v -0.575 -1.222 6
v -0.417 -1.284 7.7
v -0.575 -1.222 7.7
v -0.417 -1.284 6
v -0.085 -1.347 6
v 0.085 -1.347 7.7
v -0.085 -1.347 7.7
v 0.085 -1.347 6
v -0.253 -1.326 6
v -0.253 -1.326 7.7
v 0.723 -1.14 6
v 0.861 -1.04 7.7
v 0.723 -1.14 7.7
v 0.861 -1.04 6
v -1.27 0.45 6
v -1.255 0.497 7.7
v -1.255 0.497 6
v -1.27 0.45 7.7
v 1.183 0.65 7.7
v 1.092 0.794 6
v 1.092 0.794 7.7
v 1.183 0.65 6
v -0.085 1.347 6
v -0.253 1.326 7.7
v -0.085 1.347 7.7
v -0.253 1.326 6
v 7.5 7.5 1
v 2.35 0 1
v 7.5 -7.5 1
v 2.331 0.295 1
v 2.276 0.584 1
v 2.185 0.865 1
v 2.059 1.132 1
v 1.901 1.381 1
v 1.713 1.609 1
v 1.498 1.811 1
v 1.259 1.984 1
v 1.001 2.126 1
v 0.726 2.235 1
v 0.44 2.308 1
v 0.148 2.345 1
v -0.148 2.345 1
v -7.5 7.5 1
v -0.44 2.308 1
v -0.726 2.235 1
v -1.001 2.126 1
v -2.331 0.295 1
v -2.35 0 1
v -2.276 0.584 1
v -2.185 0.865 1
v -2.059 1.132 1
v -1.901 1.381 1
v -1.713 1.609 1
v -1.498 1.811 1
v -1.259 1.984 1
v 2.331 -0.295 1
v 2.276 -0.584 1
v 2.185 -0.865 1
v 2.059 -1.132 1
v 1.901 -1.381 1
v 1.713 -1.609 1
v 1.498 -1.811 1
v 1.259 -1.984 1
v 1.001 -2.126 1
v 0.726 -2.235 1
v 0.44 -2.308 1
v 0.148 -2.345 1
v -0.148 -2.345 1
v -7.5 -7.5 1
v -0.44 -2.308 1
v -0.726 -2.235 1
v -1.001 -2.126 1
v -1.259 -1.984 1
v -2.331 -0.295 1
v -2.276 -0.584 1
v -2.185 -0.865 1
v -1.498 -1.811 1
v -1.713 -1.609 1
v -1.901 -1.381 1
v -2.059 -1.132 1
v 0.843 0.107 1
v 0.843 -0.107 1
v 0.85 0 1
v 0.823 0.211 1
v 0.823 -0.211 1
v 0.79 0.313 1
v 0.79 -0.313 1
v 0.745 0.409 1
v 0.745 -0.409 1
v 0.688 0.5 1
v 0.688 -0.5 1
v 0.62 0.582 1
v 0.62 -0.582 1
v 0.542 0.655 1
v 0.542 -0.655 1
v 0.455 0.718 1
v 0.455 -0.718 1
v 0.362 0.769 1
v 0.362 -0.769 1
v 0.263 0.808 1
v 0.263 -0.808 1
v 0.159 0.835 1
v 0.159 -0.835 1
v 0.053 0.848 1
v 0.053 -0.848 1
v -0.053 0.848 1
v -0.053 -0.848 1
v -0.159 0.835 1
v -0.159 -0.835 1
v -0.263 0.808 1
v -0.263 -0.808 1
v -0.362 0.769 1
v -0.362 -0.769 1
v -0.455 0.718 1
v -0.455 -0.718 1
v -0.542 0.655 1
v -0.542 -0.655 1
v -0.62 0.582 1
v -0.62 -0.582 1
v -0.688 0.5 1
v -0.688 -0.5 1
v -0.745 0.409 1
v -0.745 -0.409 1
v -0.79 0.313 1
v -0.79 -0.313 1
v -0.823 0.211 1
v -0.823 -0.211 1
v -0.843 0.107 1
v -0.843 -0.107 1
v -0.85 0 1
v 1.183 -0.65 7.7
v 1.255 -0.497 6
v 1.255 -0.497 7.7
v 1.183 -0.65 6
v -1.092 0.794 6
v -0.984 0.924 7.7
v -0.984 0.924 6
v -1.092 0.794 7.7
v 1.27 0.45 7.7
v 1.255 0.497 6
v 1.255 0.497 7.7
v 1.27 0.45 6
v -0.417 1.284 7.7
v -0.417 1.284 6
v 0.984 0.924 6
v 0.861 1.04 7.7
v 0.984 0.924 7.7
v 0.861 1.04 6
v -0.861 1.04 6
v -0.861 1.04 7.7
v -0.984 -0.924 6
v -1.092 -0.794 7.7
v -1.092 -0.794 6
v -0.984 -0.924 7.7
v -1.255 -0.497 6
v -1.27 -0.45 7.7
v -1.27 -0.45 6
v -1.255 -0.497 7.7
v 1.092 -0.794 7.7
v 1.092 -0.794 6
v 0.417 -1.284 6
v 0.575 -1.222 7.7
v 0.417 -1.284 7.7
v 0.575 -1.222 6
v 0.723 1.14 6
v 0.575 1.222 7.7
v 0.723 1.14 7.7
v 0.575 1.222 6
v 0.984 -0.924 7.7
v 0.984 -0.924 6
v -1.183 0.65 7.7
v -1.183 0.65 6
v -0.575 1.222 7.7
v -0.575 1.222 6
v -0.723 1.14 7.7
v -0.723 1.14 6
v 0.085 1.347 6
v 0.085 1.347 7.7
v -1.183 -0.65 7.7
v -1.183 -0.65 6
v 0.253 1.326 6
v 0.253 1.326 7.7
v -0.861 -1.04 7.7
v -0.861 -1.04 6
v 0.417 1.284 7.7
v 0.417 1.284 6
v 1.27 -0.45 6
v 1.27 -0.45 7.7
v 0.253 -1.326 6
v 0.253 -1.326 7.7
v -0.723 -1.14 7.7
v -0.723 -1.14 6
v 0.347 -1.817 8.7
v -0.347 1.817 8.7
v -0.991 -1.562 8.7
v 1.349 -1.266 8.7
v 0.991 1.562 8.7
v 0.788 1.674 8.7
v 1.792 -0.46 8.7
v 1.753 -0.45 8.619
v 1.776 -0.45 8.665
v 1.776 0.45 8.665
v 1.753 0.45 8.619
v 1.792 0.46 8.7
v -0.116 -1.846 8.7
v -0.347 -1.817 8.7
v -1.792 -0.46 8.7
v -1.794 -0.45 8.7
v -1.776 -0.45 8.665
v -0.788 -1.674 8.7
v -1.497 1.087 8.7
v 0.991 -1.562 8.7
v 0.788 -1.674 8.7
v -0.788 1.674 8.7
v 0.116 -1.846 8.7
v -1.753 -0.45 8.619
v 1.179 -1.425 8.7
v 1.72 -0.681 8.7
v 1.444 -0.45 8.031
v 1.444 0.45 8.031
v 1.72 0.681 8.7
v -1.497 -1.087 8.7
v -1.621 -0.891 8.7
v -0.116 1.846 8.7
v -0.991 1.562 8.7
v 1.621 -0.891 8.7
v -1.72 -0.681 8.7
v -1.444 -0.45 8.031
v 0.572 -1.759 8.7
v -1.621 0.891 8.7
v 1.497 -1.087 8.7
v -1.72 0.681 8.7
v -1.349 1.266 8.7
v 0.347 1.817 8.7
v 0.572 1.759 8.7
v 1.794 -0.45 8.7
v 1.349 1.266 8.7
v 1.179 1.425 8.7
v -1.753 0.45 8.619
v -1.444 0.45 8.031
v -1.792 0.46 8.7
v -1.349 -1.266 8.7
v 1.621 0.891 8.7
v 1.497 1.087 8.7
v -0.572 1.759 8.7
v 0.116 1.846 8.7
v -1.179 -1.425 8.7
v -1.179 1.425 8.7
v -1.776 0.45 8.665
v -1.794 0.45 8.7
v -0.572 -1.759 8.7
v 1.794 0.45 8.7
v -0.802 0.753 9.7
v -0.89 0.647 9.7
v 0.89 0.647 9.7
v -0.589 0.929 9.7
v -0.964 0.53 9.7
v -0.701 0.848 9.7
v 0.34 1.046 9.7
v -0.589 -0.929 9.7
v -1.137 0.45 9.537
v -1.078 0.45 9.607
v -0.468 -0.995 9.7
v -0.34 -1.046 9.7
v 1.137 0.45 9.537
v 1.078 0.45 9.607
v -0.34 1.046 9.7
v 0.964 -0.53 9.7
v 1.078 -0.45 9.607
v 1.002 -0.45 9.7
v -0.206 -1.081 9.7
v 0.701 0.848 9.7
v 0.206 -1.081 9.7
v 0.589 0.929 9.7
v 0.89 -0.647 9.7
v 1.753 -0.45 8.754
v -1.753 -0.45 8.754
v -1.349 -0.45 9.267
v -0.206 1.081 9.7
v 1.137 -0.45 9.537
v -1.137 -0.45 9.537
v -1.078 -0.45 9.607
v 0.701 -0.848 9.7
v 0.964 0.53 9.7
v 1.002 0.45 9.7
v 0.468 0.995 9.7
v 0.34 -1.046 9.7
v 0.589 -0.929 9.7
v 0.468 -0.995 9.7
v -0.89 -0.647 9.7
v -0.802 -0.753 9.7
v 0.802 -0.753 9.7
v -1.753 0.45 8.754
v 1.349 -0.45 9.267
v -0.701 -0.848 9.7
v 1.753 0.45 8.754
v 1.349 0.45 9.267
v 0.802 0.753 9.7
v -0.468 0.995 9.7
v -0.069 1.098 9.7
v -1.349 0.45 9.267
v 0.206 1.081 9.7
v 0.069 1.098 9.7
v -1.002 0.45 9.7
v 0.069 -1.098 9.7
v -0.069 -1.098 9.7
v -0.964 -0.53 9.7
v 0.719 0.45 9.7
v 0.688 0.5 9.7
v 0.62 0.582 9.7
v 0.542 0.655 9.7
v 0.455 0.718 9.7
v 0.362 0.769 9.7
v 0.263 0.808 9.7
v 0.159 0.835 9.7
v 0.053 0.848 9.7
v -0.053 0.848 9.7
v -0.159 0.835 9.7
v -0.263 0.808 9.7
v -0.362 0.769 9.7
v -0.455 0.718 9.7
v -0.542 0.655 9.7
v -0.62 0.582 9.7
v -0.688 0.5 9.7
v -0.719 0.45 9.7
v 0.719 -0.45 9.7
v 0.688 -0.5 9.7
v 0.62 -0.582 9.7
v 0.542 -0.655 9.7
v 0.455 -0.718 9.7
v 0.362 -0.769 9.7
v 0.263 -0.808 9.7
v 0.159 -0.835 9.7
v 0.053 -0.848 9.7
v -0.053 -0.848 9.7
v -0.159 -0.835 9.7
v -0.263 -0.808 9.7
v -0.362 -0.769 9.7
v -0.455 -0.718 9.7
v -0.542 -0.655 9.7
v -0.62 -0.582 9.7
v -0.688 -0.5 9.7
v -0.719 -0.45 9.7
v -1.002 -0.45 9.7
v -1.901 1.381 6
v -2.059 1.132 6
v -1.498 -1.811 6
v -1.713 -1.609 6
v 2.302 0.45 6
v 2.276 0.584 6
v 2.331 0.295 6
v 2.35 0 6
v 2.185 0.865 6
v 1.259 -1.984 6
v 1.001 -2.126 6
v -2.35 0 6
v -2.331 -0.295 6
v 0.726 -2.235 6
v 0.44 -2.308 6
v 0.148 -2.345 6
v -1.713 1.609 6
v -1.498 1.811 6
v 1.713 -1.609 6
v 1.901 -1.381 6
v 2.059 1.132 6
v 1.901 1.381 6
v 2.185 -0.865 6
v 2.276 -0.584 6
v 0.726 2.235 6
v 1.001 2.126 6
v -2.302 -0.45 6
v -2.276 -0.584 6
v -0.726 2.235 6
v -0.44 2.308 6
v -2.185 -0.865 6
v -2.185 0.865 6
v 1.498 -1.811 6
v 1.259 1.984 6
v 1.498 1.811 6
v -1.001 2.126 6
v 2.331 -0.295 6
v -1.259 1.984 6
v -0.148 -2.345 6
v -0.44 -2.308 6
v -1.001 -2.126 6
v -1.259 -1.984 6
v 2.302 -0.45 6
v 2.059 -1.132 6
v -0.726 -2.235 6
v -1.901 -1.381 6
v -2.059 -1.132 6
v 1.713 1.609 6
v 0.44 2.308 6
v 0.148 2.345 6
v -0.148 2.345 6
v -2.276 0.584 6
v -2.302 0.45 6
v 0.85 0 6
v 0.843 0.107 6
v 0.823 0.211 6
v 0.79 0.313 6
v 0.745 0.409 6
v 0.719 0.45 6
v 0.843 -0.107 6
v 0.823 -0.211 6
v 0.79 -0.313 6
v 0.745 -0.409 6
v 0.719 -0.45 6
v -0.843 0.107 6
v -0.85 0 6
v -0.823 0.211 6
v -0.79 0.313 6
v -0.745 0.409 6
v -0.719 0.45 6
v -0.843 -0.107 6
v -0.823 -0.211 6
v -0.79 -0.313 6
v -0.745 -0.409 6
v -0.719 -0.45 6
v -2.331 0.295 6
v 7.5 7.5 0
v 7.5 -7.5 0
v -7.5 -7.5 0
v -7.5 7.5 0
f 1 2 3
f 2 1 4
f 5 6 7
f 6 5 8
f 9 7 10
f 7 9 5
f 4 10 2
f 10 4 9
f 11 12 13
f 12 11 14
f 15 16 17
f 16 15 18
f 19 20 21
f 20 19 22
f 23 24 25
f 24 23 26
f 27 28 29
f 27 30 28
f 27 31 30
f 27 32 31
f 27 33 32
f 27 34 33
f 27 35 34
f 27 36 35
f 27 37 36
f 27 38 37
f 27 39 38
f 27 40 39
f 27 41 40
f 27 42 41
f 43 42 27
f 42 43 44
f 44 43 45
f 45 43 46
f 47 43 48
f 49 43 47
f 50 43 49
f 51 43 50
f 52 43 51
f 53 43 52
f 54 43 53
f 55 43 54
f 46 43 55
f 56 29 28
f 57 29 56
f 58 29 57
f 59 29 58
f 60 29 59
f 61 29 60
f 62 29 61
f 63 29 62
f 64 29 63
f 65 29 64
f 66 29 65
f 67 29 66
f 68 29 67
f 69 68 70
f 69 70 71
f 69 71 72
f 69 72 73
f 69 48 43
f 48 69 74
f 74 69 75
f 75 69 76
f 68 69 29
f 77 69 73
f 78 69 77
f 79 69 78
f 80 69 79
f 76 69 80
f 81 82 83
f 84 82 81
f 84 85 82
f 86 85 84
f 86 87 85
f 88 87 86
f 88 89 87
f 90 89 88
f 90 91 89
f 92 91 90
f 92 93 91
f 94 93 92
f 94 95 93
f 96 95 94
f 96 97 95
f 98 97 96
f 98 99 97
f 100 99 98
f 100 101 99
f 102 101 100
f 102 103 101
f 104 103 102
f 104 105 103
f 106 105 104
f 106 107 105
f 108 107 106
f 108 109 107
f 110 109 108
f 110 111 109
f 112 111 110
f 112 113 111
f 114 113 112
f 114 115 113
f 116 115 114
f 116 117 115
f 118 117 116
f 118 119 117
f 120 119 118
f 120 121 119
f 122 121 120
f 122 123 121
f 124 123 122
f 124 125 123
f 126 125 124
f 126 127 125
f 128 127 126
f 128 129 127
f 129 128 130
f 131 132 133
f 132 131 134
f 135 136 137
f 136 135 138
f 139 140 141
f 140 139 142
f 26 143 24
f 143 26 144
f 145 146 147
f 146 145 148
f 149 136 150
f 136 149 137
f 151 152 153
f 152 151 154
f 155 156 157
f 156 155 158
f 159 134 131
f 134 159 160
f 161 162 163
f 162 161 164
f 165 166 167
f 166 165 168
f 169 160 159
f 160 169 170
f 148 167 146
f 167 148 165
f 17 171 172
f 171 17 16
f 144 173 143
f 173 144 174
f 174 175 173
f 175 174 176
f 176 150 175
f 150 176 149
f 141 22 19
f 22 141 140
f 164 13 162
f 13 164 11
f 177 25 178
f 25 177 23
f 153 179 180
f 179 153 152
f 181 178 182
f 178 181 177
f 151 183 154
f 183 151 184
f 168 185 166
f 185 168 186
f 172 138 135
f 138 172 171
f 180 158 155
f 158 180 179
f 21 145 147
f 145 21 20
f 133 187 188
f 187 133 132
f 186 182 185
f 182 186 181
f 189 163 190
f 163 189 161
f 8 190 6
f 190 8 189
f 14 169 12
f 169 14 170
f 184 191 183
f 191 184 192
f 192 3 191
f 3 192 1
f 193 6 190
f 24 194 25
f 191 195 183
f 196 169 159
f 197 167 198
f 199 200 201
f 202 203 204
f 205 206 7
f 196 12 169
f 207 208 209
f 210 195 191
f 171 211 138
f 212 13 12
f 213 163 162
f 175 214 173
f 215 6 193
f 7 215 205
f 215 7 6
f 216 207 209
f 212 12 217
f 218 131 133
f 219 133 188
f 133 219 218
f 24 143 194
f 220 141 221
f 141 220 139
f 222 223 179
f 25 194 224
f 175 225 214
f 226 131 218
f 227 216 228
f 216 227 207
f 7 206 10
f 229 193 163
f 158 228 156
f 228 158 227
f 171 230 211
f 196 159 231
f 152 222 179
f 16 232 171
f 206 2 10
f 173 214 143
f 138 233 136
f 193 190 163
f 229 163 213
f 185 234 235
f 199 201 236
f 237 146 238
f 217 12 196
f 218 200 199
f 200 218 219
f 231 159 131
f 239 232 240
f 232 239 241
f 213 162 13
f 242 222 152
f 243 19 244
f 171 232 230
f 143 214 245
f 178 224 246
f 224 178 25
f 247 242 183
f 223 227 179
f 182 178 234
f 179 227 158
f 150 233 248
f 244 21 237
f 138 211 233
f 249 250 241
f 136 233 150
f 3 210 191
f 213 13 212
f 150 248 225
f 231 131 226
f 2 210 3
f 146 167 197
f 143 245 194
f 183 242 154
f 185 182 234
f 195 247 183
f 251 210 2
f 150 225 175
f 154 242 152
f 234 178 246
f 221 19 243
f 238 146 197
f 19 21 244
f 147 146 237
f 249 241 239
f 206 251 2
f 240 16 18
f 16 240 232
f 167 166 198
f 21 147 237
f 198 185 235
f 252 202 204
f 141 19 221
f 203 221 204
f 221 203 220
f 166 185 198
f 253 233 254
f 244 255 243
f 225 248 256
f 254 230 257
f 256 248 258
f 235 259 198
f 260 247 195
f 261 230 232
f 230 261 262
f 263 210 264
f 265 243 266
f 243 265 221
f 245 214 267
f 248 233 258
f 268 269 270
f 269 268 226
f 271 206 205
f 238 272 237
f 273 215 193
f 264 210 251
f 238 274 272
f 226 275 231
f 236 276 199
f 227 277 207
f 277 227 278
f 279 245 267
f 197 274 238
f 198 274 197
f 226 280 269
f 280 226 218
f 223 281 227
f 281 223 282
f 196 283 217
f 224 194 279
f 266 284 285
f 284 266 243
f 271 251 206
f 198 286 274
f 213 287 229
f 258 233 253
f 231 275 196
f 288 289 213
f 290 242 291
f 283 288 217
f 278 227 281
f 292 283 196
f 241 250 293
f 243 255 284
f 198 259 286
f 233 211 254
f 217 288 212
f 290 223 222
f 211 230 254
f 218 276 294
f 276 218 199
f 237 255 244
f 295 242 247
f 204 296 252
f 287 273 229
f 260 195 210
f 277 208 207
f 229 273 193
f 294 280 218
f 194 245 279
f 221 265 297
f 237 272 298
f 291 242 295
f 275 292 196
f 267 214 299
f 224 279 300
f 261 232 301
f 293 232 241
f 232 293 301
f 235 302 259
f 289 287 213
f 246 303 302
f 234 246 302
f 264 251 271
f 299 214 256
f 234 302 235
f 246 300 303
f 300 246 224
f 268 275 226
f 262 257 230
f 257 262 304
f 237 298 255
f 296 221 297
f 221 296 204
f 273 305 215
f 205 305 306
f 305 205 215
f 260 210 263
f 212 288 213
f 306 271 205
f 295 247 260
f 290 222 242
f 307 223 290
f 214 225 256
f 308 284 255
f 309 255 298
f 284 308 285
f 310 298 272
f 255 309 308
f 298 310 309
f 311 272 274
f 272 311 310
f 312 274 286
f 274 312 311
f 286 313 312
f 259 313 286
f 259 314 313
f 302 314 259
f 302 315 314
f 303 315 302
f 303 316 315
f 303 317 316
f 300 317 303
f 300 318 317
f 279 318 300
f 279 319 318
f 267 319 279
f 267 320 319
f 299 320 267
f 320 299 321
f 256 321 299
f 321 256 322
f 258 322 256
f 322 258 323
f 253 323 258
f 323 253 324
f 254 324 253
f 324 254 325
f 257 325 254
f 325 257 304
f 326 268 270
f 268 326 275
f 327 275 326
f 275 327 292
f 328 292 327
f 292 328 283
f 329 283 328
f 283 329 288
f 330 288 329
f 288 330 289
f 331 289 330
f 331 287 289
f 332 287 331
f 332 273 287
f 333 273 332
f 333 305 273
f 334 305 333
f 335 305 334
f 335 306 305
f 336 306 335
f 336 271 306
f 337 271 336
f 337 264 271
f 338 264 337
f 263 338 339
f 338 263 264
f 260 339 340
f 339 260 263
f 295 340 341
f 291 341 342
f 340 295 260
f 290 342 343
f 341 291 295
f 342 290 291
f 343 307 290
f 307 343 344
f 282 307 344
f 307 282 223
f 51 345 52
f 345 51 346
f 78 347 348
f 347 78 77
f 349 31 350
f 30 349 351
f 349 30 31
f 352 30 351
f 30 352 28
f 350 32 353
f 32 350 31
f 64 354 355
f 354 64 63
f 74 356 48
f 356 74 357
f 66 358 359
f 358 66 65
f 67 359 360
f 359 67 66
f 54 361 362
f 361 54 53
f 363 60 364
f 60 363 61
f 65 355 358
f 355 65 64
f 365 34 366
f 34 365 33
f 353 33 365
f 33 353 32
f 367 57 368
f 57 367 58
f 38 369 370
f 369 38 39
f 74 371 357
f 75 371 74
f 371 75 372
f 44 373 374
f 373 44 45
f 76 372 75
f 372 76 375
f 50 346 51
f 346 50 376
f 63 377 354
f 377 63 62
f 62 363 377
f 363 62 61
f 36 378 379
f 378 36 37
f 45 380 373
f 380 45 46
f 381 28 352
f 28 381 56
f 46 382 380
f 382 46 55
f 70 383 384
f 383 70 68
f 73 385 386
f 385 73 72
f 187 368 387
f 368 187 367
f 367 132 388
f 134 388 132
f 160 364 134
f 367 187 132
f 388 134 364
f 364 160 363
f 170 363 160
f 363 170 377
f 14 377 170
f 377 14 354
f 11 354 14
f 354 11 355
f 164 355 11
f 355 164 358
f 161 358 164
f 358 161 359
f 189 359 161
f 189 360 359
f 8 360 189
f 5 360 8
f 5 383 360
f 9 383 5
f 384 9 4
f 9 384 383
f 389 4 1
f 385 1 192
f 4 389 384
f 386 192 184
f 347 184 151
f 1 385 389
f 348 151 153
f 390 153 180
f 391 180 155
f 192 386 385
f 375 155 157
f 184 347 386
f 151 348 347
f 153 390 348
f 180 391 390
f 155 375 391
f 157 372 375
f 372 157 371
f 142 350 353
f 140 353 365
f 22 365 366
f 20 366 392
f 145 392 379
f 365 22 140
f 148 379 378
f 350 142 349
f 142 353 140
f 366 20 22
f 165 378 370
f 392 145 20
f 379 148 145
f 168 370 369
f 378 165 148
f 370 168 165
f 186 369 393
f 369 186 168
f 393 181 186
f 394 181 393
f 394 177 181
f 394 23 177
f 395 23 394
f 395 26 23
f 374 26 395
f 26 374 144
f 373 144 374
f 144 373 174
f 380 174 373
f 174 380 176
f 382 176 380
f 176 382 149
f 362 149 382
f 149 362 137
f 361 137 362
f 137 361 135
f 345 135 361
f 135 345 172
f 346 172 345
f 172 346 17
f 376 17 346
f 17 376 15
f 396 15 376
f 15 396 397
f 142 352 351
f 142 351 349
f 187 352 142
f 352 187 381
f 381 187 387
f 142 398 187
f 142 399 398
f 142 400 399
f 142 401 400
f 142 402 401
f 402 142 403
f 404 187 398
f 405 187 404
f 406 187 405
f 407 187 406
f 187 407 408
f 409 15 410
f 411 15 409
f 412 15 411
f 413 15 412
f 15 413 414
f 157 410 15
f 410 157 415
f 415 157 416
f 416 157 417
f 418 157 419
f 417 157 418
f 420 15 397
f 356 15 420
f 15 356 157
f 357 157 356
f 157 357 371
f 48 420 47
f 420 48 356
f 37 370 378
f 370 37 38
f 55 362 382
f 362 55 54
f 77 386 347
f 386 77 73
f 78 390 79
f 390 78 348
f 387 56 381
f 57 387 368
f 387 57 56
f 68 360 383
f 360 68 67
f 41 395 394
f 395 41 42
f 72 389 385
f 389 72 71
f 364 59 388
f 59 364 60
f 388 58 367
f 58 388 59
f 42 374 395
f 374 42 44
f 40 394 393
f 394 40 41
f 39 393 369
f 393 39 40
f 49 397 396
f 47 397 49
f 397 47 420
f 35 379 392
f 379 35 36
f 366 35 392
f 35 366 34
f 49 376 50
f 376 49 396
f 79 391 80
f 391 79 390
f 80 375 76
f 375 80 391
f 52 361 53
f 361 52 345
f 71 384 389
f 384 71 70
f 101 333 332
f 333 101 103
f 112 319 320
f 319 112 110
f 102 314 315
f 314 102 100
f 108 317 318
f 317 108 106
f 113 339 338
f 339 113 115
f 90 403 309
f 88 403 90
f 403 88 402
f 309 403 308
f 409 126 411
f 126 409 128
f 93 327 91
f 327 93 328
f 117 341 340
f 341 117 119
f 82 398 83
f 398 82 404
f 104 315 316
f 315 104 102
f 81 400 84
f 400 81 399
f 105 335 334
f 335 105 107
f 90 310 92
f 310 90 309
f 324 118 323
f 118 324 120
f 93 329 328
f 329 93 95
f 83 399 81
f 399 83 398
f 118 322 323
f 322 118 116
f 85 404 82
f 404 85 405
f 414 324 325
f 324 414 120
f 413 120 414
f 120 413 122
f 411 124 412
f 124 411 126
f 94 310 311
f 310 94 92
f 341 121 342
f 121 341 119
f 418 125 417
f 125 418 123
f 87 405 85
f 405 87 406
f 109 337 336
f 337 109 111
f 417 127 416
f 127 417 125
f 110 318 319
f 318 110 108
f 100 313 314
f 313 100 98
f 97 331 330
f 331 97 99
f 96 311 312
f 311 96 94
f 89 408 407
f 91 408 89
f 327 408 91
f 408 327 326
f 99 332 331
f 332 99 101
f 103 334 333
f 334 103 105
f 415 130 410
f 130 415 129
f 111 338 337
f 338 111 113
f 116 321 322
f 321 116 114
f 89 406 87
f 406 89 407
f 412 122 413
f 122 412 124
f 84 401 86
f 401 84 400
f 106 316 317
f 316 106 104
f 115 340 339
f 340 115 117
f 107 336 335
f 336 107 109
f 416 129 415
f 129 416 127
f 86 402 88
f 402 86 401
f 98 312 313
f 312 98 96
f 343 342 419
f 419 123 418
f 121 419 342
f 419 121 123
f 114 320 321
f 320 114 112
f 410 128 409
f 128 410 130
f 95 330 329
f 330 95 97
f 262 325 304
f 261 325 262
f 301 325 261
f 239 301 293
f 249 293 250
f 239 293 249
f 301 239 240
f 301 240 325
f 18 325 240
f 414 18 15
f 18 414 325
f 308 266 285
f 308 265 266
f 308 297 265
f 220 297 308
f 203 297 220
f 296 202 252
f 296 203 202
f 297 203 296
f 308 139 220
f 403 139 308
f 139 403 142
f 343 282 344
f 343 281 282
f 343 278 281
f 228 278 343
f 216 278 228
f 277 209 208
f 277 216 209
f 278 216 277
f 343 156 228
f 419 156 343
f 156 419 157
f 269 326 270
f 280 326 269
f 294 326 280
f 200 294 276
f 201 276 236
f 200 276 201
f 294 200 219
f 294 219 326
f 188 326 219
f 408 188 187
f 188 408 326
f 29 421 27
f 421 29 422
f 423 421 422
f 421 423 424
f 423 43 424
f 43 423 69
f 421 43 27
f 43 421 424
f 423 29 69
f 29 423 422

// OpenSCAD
/*
	Snap in PCB standoff.
	Kevin Osborn
	http://wyolum.com
	Created 5/30/2014
*/

/*
Printing Notes:
If you are printing this as a part of a case or testing jig, you can print the bottom plate hot and fast if you'd like, but for holes for M3 and smaller, you should slow down and cool the printing temperature for the tower bits. Also, if you are just printing standalone for testing fit, you need to print at least two at once in order to let the thin tower parts cool between layers.

*/

$fn=50;
module boardmount(HoleD,BoardThick,lift)
{
	topZ = lift+BoardThick;
	pegR = HoleD/2;
	// this is really a setting.
	notchW = pegR/1.5;//width of the flexy notch in terms of peg radius
	difference()
	{
		union()
		{
			cylinder(r= pegR,h = topZ); //master peg
			translate([0,0,topZ])cylinder(r1=pegR,r2= pegR+.5, h =1);// relief for overhang
			translate([0,0,topZ+1])cylinder(r1=pegR+.5,r2= pegR-.25, h =1); // insertion cone
			cylinder(r = (HoleD/2)+1, h=lift); //standoff is always 2mm> post size (Diameter)
		}
	cylinder(r= pegR-.5, h = topZ+3);
	translate([-(HoleD+2)/2,-notchW/2,lift])cube([HoleD+2,notchW,6]);//notch for insertion flex
	}//difference
}; //module


// Sample part for test fitting
translate([-7.5,-7.5,0])cube([15,15,1]);
translate([0,0,1])boardmount(HoleD = 2.7, BoardThick = 1.70, lift=5);
